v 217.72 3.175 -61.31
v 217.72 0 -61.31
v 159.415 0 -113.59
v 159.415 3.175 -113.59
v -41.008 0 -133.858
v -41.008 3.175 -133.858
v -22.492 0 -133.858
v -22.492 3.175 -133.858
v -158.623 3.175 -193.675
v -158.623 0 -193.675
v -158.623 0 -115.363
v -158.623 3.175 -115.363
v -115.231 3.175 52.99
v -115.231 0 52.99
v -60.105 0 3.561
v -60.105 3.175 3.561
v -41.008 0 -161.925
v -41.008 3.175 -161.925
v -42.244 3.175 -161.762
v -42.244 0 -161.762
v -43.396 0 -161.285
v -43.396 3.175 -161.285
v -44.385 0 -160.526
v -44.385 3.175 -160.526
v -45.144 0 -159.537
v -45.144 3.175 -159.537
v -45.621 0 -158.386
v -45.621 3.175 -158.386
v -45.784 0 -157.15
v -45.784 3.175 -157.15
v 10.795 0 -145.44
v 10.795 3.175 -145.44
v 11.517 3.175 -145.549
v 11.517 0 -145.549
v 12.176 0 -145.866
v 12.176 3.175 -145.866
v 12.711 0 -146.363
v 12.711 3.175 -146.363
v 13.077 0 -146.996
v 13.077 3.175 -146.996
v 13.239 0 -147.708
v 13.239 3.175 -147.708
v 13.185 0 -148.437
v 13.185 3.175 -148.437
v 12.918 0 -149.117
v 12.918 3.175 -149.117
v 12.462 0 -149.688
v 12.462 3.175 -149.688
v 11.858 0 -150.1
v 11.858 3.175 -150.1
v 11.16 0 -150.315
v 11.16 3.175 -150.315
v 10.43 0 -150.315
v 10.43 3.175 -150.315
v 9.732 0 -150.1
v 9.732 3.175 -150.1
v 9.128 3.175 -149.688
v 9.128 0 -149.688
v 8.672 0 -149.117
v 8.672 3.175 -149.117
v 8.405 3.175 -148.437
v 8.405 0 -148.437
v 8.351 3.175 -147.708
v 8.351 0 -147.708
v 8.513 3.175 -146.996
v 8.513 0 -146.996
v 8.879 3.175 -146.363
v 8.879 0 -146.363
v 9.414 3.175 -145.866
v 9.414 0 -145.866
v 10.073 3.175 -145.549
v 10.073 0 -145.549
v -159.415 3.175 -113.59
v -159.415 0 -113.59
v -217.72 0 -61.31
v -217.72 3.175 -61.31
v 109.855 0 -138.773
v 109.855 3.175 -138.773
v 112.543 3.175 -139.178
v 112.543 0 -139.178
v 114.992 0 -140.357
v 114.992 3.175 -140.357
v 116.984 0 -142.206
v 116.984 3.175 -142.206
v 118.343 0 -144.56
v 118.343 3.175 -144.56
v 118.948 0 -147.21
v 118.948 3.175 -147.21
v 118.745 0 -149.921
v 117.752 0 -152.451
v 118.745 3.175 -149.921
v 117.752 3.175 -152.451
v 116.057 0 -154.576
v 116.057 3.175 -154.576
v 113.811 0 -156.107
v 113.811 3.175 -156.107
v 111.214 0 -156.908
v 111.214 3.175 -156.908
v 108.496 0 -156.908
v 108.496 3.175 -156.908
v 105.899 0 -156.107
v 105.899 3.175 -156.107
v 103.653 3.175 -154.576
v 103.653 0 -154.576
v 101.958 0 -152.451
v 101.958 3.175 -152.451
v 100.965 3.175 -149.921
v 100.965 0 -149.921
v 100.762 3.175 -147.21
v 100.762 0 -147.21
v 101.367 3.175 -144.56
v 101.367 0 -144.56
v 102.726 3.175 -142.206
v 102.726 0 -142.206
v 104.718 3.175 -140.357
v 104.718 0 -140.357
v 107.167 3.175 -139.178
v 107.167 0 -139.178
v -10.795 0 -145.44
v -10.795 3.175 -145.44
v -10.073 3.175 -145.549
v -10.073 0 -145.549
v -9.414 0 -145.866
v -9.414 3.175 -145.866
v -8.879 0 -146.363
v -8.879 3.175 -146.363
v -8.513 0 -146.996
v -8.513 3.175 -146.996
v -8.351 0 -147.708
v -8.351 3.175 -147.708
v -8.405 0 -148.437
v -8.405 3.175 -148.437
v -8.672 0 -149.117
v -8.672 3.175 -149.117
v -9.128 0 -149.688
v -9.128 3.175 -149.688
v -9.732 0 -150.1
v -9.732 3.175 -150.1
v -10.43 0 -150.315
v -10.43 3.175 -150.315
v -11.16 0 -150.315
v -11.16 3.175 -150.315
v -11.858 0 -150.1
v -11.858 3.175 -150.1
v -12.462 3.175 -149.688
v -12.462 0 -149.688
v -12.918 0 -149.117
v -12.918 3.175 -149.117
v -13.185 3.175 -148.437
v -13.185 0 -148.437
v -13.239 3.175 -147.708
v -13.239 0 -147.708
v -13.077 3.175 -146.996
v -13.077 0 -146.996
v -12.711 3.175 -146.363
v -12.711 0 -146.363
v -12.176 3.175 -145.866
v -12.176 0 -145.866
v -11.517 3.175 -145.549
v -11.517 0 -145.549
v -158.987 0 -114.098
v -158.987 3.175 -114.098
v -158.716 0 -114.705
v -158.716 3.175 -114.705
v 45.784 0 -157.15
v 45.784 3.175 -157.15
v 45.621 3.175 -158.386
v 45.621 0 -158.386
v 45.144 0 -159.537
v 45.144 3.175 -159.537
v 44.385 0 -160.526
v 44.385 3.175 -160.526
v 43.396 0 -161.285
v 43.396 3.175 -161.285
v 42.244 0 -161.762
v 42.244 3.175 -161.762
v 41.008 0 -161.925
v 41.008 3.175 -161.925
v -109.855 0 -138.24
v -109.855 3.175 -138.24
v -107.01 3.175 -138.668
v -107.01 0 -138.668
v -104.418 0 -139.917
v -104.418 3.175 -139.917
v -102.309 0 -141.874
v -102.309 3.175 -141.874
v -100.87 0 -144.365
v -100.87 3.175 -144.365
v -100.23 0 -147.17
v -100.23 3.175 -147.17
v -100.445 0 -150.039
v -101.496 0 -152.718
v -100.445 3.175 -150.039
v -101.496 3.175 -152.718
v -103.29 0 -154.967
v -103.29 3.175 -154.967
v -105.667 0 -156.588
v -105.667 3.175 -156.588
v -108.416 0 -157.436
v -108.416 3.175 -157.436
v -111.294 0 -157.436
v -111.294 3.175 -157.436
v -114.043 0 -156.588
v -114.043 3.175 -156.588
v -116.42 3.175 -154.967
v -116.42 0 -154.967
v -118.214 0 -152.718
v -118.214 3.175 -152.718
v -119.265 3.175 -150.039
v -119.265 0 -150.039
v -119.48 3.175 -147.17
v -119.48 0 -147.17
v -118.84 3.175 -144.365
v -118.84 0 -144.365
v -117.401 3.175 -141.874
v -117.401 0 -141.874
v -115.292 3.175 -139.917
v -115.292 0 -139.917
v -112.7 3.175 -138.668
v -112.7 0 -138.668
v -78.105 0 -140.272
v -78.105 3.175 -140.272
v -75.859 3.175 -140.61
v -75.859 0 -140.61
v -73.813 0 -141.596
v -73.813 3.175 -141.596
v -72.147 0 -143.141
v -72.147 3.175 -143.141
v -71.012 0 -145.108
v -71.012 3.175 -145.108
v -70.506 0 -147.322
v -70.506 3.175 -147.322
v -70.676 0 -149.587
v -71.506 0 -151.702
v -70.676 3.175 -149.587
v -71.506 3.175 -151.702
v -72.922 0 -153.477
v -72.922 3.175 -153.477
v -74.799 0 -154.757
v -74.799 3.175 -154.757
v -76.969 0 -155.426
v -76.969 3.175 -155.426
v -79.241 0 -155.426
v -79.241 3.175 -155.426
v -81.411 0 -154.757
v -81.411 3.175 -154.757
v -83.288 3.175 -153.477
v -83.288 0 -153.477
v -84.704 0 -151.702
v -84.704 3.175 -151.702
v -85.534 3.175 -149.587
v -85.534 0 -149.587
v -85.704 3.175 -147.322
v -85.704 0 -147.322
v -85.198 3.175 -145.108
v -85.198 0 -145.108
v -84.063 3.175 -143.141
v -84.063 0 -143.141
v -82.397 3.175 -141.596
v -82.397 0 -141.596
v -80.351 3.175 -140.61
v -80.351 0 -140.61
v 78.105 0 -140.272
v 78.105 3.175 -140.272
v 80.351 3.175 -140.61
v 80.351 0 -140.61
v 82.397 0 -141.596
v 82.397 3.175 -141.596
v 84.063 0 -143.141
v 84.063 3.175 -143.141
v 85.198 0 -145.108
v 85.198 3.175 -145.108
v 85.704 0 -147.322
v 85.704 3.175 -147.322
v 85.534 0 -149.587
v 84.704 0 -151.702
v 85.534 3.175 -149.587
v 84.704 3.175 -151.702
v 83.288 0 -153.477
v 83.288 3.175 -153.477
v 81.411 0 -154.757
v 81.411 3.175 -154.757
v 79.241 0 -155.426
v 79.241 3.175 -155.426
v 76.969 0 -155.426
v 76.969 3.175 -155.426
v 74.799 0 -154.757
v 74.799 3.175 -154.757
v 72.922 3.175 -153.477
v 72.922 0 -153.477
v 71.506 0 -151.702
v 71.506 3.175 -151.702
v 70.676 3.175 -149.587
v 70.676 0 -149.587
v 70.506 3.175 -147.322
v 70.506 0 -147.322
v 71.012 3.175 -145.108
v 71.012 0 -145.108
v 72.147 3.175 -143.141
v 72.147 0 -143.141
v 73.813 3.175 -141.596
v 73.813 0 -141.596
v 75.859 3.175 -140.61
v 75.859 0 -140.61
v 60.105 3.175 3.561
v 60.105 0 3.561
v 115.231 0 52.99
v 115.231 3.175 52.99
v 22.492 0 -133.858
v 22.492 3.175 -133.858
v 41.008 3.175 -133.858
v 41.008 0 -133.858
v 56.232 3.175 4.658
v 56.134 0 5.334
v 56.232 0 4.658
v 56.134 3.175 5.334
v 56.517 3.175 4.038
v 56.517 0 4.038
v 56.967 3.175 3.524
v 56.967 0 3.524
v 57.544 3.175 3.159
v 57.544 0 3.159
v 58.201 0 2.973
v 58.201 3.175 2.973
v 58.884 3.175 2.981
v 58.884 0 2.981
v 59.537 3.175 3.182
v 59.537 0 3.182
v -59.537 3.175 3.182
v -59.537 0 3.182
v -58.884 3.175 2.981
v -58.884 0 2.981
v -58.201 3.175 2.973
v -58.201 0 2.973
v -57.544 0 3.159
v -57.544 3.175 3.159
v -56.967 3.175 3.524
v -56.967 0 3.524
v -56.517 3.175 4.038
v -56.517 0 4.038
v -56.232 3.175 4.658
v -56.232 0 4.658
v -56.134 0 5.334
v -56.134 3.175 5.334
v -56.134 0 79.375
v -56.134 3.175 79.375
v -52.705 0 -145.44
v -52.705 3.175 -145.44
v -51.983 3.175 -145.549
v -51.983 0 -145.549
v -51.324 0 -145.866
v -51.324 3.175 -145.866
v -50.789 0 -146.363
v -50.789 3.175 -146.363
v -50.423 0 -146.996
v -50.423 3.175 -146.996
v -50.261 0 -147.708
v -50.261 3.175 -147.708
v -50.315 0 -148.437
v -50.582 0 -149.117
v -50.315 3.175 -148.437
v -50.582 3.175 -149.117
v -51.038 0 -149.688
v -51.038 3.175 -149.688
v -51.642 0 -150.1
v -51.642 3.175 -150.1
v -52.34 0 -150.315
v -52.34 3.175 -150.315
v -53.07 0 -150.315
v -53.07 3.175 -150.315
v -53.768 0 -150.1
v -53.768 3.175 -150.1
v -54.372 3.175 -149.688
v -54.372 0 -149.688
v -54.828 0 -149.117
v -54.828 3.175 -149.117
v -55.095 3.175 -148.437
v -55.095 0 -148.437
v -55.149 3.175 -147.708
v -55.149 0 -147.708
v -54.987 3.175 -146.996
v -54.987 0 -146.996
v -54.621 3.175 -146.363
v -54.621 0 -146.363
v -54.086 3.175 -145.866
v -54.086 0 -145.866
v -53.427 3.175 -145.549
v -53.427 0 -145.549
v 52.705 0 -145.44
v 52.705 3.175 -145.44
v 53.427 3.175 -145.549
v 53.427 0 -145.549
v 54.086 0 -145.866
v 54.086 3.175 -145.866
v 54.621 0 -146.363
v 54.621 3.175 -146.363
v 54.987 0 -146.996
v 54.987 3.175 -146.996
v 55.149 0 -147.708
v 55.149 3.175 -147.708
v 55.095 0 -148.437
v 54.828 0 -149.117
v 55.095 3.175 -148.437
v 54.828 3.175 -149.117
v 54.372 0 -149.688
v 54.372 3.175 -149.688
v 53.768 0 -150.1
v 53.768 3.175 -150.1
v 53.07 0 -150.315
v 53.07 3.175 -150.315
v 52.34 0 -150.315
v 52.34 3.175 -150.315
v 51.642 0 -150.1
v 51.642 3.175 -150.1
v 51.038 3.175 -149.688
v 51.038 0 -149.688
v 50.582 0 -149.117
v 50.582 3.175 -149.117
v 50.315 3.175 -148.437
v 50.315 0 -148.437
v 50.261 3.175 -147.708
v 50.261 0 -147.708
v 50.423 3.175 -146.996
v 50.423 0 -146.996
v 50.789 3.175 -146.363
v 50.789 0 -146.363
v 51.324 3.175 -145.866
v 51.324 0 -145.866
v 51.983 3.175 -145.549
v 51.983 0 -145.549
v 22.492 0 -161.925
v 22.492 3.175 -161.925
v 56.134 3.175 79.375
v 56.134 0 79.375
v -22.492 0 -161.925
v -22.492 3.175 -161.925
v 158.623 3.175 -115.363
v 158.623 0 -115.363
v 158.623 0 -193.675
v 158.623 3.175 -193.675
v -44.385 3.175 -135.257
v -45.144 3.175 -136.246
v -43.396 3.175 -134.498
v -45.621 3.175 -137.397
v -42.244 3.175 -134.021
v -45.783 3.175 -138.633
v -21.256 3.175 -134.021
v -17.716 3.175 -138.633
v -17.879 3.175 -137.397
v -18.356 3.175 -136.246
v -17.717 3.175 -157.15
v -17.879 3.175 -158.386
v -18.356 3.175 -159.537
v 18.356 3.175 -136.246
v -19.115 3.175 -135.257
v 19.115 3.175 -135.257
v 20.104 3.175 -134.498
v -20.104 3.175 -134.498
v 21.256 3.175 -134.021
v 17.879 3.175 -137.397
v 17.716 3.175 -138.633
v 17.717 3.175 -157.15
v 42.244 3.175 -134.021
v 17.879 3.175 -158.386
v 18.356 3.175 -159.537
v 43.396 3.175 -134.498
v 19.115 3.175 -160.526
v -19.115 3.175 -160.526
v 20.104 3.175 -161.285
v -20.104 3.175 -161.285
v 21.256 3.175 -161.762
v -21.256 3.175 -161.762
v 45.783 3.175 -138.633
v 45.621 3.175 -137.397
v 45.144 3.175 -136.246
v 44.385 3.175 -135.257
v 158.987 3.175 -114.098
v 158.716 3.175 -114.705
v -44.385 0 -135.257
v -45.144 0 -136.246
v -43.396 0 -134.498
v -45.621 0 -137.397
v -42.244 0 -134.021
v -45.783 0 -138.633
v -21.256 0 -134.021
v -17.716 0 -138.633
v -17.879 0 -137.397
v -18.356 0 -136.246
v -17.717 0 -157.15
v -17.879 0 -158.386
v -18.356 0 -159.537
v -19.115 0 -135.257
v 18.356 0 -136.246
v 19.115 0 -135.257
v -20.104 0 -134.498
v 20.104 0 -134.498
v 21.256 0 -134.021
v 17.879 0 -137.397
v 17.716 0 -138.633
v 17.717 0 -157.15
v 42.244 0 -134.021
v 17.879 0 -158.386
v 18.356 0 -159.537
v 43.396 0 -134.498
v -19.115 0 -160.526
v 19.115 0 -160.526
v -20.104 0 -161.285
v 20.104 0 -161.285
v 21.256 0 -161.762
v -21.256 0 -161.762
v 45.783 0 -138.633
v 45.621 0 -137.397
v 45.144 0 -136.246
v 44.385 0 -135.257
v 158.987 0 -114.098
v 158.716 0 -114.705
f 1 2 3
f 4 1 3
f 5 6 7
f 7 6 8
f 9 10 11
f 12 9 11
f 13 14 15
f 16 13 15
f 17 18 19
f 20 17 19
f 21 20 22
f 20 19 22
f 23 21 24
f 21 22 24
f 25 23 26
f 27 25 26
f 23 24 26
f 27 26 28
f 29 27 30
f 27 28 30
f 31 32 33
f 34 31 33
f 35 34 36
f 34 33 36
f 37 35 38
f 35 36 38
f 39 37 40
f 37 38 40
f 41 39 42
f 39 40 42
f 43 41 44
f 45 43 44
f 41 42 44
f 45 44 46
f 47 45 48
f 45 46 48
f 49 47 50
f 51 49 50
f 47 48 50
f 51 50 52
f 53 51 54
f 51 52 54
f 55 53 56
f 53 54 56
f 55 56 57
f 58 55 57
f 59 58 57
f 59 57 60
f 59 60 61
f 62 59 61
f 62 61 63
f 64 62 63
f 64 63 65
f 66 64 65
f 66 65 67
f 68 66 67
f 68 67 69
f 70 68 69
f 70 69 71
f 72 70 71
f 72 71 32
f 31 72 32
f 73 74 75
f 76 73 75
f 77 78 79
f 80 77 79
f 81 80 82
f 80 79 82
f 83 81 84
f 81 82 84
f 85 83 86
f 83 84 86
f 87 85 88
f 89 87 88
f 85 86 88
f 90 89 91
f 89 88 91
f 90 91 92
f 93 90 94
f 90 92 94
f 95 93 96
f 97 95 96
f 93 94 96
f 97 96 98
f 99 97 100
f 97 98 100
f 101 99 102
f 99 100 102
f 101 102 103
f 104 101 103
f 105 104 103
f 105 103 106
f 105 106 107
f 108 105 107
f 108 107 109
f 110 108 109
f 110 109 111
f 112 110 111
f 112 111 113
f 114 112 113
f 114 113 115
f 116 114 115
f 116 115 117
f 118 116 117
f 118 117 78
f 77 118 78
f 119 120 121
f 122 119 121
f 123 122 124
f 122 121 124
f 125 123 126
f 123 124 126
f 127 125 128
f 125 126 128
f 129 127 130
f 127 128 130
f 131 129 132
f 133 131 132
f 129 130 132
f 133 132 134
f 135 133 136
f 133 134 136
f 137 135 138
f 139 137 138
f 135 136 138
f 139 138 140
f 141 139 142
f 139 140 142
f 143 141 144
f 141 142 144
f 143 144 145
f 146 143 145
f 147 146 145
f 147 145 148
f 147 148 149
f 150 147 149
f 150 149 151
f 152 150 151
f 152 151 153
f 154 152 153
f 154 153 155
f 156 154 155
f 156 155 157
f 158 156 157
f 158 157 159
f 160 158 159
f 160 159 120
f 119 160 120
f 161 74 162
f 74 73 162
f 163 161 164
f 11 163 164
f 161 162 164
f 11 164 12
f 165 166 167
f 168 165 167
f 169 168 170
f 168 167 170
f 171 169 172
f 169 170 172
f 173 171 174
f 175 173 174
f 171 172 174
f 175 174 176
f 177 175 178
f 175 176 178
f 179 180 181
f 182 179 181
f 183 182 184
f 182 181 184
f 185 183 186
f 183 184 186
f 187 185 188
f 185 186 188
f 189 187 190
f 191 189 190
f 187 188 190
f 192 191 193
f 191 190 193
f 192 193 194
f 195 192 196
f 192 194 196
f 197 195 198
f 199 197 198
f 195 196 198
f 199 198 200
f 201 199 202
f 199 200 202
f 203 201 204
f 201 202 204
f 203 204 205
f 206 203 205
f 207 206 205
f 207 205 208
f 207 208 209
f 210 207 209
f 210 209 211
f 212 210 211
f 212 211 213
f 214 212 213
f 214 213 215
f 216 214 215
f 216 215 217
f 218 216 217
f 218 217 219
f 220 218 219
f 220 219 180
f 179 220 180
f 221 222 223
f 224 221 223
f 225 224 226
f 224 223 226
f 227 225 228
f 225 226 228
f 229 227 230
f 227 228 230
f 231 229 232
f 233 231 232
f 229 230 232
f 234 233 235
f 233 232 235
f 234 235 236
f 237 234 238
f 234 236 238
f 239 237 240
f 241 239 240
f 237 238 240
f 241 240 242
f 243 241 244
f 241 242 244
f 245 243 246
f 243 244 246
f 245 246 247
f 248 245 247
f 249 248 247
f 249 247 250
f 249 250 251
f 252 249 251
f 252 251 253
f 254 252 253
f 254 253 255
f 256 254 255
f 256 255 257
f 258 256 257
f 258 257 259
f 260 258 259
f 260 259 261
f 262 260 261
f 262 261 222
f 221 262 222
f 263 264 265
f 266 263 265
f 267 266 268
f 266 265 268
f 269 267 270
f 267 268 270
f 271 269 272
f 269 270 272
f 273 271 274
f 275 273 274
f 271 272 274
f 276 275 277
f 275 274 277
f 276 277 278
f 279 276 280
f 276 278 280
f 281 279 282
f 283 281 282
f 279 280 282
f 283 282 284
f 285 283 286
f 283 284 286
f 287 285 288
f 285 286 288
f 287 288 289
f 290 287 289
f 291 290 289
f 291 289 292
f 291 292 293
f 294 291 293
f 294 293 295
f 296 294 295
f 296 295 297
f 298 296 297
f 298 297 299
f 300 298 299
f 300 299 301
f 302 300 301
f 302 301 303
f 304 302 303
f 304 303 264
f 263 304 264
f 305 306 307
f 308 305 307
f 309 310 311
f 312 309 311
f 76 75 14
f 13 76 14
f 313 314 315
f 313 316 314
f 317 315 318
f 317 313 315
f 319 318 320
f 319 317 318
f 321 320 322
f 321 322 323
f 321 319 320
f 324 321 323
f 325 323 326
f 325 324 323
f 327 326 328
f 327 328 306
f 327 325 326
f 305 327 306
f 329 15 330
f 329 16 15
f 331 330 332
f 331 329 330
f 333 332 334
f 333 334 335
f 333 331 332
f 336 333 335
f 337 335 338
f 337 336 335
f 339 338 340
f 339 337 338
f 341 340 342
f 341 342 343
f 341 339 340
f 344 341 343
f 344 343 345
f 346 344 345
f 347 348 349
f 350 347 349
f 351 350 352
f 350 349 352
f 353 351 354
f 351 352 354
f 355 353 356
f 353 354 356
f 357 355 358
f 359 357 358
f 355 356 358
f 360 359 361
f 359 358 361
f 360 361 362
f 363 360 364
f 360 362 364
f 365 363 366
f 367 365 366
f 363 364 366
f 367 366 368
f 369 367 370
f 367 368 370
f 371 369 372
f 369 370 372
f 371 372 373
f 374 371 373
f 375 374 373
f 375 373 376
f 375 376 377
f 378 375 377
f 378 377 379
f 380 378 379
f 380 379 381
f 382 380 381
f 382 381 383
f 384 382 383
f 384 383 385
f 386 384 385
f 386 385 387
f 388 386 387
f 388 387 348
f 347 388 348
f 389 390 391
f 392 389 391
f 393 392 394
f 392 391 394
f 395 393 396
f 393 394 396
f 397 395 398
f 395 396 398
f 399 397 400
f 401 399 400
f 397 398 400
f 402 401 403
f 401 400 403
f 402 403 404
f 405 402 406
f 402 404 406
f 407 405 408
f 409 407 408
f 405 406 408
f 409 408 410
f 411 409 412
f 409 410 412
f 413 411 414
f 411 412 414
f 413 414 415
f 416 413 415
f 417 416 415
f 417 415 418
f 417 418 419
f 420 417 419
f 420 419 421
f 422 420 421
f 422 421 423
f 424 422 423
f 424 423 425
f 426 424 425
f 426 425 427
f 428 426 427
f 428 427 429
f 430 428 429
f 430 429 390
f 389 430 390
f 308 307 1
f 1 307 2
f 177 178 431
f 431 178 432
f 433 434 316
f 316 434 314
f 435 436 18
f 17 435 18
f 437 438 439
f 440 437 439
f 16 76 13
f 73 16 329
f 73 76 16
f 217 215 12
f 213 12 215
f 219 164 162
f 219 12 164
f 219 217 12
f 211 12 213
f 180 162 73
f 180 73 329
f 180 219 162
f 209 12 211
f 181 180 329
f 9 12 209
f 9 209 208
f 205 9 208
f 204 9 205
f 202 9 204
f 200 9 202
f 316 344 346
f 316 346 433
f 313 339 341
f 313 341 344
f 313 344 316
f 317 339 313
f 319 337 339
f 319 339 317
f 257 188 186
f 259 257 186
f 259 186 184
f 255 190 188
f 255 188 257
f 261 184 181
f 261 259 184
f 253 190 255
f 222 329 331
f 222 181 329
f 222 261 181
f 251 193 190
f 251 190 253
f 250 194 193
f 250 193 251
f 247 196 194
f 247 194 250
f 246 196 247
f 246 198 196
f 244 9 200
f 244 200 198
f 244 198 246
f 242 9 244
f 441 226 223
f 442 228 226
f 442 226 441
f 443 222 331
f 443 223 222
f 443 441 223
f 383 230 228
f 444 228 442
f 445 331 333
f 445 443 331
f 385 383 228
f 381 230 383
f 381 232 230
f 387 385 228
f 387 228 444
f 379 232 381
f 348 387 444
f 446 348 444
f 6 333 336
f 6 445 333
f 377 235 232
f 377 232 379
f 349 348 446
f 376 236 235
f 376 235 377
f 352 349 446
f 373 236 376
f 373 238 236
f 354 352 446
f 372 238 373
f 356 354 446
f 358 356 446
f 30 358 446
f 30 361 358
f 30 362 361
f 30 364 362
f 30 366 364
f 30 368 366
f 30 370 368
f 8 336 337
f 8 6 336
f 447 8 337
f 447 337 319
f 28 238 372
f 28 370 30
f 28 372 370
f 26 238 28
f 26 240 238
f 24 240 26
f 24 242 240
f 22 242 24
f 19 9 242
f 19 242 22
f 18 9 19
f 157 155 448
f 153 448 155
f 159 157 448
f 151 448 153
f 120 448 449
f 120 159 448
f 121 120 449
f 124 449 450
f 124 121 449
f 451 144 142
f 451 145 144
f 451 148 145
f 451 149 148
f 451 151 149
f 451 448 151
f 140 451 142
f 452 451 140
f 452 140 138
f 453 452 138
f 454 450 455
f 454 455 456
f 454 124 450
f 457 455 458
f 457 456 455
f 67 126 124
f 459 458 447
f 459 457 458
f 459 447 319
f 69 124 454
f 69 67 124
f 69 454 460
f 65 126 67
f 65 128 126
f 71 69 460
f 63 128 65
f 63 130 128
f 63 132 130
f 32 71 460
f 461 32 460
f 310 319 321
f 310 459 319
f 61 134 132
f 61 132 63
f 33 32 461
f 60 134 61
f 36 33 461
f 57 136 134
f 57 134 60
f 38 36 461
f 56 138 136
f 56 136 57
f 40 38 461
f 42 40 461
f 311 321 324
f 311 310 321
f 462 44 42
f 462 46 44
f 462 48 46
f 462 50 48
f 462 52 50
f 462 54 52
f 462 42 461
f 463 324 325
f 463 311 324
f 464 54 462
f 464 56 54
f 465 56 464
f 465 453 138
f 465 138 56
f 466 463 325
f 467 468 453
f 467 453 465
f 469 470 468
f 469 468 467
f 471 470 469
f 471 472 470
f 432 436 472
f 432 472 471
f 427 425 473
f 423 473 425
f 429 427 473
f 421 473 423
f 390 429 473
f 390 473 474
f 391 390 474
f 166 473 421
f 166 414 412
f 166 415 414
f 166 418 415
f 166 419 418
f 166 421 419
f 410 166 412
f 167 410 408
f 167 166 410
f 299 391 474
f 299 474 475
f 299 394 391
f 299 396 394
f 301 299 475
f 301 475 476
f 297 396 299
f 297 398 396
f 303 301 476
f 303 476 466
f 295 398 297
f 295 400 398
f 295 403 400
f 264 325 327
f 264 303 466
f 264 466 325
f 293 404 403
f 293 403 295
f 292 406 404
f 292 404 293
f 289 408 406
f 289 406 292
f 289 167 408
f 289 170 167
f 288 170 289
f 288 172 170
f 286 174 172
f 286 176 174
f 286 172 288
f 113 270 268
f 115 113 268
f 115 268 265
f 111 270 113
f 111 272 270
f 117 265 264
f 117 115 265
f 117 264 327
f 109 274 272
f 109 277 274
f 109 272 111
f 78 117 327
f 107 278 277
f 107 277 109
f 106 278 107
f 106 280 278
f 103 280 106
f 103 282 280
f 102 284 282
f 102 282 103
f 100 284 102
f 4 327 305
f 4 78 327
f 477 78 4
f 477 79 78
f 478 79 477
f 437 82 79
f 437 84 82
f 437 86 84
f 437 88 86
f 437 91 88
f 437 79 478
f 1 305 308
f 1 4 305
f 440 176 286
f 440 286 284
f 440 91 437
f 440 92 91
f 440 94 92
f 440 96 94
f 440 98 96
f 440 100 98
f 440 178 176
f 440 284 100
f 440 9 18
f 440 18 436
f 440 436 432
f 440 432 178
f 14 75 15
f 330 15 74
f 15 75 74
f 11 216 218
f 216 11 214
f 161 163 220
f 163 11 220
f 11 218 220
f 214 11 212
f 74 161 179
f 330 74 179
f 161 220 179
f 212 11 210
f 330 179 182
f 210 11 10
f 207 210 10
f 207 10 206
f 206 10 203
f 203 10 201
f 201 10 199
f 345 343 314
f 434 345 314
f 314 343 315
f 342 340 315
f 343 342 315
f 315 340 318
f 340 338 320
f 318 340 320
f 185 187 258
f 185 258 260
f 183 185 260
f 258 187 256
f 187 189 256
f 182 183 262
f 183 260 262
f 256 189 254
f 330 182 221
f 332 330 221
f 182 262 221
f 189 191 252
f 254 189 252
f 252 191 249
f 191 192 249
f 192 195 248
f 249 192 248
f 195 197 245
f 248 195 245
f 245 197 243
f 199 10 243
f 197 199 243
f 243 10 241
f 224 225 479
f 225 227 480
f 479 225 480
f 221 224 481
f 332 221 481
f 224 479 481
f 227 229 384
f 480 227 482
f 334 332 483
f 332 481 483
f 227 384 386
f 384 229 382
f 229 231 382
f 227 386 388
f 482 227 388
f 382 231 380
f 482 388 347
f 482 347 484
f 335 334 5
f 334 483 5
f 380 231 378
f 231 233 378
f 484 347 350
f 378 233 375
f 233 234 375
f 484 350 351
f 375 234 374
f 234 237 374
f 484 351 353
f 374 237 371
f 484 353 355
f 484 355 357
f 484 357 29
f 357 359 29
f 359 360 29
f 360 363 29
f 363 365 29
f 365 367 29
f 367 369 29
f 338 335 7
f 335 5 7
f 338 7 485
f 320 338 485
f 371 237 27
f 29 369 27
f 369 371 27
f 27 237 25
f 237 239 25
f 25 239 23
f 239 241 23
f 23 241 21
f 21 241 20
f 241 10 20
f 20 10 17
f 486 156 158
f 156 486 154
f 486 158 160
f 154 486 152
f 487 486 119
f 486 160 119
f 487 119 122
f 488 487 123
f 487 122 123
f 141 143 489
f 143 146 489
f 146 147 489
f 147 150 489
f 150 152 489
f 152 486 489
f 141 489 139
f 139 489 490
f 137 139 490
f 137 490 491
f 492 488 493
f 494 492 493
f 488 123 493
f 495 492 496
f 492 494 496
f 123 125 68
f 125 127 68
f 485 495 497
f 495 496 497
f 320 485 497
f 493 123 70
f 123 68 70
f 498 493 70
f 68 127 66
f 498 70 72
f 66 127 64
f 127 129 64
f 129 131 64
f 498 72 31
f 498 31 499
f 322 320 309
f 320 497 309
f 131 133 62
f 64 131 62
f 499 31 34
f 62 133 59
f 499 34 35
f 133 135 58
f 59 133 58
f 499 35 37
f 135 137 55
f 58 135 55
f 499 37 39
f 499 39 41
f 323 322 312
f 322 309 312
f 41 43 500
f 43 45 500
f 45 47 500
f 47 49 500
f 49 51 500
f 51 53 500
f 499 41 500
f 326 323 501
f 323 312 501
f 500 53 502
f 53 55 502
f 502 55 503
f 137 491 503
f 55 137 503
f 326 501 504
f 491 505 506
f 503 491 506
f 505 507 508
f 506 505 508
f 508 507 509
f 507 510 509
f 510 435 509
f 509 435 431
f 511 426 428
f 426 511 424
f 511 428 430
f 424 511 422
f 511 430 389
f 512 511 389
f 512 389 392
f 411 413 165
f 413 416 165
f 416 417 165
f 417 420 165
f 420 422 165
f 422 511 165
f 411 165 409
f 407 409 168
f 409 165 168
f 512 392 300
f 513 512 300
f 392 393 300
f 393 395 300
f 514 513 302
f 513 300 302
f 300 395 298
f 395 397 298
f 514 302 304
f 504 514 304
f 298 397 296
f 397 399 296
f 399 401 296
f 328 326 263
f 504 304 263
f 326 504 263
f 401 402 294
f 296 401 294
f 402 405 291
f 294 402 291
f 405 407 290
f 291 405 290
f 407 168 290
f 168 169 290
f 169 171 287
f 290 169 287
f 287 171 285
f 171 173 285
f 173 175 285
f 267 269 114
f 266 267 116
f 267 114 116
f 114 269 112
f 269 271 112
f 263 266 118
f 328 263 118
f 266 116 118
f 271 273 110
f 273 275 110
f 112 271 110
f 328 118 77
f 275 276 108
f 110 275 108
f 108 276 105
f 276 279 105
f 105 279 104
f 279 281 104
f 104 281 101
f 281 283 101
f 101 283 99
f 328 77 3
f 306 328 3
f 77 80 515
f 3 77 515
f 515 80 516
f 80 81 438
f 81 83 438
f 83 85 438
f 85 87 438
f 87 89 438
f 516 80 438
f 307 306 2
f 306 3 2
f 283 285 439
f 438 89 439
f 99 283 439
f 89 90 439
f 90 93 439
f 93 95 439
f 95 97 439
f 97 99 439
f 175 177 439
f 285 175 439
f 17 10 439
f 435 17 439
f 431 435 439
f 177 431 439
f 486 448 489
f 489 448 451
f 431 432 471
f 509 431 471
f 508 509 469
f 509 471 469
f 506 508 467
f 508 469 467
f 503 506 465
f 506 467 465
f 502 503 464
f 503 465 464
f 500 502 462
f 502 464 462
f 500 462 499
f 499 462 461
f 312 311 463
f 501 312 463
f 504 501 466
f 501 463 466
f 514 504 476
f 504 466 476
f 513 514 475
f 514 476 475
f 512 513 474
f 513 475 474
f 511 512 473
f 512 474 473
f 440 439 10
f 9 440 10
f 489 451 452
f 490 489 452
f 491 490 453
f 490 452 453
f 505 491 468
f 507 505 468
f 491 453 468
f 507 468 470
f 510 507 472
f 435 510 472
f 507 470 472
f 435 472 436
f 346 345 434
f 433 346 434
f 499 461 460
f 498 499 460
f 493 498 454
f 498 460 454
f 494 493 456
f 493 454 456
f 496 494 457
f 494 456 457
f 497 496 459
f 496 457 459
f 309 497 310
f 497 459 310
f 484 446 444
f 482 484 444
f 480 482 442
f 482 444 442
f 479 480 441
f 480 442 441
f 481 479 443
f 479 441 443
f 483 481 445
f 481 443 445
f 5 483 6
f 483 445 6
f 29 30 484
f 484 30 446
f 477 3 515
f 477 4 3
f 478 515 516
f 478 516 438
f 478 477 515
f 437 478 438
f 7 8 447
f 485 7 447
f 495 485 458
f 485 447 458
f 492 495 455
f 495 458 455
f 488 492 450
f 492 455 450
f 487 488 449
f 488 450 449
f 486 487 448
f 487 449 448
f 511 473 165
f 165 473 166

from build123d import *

# Parameters (mm, degrees)
BOSS_EXTRUDE1_DEPTH = 3.175
FILLET1_R           = 2.38125
SKETCH2_R           = 2.4511
SKETCH2_R_2         = 9.652
SKETCH2_R_3         = 7.62
SKETCH2_R_4         = 9.1186
CUT_EXTRUDE1_DEPTH  = 292.413808153


with BuildPart() as part:
    # Sketch1 → Boss-Extrude1 (new body)
    with BuildSketch(Plane(origin=(0, 0, 0), x_dir=(1, 0, 0), z_dir=(0, 1, 0))):
        Polygon((-158.623, 114.3), (-217.719823012, 61.309848699), (-115.230823012, -52.990151301), (-56.134, 0), (-56.134, -79.375), (56.134, -79.375), (56.134, 0), (115.230823012, -52.990151301), (217.719823012, 61.309848699), (158.623, 114.3), (158.623, 193.675), (-158.623, 193.675), align=None)
    extrude(amount=BOSS_EXTRUDE1_DEPTH)

    # Fillet1
    fillet1_edges = [part.edges().sort_by_distance(p)[0] for p in [
        (-56.134, 1.5875, 0),
        (-158.623, 1.5875, -114.3),
        (158.623, 1.5875, -114.3),
        (56.134, 1.5875, 0),
    ]]
    fillet(fillet1_edges, radius=FILLET1_R)

    # Sketch2 → Cut-Extrude1 (cut, through all)
    with BuildSketch(Plane(origin=(0, 3.175, 0), x_dir=(1, 0, 0), z_dir=(0, 1, 0))):
        with Locations(Location((52.705, 147.8915, 0), (0, 0, 270))):
            Circle(SKETCH2_R)
        with Locations(Location((10.795, 147.8915, 0), (0, 0, 270))):
            Circle(SKETCH2_R)
        with Locations(Location((-10.795, 147.8915, 0), (0, 0, 270))):
            Circle(SKETCH2_R)
        with Locations(Location((-52.705, 147.8915, 0), (0, 0, 270))):
            Circle(SKETCH2_R)
        with Locations(Location((-109.855, 147.8915, 0), (0, 0, 270))):
            Circle(SKETCH2_R_2)
        with Locations(Location((-78.105, 147.8915, 0), (0, 0, 270))):
            Circle(SKETCH2_R_3)
        with Locations(Location((78.105, 147.8915, 0), (0, 0, 270))):
            Circle(SKETCH2_R_3)
        with Locations(Location((109.855, 147.8915, 0), (0, 0, 270))):
            Circle(SKETCH2_R_4)
        with BuildLine():
            Line((17.7165, 157.1498), (17.7165, 138.6332))
            ThreePointArc((17.7165, 138.6332), (19.115123698, 135.256623698), (22.4917, 133.858))
            Line((22.4917, 133.858), (41.0083, 133.858))
            ThreePointArc((41.0083, 133.858), (44.384876302, 135.256623698), (45.7835, 138.6332))
            Line((45.7835, 138.6332), (45.7835, 157.1498))
            ThreePointArc((45.7835, 157.1498), (44.384876302, 160.526376302), (41.0083, 161.925))
            Line((41.0083, 161.925), (22.4917, 161.925))
            ThreePointArc((22.4917, 161.925), (19.115123698, 160.526376302), (17.7165, 157.1498))
        make_face()
        with BuildLine():
            Line((-45.7835, 157.1498), (-45.7835, 138.6332))
            ThreePointArc((-45.7835, 138.6332), (-44.384876302, 135.256623698), (-41.0083, 133.858))
            Line((-41.0083, 133.858), (-22.4917, 133.858))
            ThreePointArc((-22.4917, 133.858), (-19.115123698, 135.256623698), (-17.7165, 138.6332))
            Line((-17.7165, 138.6332), (-17.7165, 157.1498))
            ThreePointArc((-17.7165, 157.1498), (-19.115123698, 160.526376302), (-22.4917, 161.925))
            Line((-22.4917, 161.925), (-41.0083, 161.925))
            ThreePointArc((-41.0083, 161.925), (-44.384876302, 160.526376302), (-45.7835, 157.1498))
        make_face()
    extrude(amount=-CUT_EXTRUDE1_DEPTH, mode=Mode.SUBTRACT)


solid = part.part
